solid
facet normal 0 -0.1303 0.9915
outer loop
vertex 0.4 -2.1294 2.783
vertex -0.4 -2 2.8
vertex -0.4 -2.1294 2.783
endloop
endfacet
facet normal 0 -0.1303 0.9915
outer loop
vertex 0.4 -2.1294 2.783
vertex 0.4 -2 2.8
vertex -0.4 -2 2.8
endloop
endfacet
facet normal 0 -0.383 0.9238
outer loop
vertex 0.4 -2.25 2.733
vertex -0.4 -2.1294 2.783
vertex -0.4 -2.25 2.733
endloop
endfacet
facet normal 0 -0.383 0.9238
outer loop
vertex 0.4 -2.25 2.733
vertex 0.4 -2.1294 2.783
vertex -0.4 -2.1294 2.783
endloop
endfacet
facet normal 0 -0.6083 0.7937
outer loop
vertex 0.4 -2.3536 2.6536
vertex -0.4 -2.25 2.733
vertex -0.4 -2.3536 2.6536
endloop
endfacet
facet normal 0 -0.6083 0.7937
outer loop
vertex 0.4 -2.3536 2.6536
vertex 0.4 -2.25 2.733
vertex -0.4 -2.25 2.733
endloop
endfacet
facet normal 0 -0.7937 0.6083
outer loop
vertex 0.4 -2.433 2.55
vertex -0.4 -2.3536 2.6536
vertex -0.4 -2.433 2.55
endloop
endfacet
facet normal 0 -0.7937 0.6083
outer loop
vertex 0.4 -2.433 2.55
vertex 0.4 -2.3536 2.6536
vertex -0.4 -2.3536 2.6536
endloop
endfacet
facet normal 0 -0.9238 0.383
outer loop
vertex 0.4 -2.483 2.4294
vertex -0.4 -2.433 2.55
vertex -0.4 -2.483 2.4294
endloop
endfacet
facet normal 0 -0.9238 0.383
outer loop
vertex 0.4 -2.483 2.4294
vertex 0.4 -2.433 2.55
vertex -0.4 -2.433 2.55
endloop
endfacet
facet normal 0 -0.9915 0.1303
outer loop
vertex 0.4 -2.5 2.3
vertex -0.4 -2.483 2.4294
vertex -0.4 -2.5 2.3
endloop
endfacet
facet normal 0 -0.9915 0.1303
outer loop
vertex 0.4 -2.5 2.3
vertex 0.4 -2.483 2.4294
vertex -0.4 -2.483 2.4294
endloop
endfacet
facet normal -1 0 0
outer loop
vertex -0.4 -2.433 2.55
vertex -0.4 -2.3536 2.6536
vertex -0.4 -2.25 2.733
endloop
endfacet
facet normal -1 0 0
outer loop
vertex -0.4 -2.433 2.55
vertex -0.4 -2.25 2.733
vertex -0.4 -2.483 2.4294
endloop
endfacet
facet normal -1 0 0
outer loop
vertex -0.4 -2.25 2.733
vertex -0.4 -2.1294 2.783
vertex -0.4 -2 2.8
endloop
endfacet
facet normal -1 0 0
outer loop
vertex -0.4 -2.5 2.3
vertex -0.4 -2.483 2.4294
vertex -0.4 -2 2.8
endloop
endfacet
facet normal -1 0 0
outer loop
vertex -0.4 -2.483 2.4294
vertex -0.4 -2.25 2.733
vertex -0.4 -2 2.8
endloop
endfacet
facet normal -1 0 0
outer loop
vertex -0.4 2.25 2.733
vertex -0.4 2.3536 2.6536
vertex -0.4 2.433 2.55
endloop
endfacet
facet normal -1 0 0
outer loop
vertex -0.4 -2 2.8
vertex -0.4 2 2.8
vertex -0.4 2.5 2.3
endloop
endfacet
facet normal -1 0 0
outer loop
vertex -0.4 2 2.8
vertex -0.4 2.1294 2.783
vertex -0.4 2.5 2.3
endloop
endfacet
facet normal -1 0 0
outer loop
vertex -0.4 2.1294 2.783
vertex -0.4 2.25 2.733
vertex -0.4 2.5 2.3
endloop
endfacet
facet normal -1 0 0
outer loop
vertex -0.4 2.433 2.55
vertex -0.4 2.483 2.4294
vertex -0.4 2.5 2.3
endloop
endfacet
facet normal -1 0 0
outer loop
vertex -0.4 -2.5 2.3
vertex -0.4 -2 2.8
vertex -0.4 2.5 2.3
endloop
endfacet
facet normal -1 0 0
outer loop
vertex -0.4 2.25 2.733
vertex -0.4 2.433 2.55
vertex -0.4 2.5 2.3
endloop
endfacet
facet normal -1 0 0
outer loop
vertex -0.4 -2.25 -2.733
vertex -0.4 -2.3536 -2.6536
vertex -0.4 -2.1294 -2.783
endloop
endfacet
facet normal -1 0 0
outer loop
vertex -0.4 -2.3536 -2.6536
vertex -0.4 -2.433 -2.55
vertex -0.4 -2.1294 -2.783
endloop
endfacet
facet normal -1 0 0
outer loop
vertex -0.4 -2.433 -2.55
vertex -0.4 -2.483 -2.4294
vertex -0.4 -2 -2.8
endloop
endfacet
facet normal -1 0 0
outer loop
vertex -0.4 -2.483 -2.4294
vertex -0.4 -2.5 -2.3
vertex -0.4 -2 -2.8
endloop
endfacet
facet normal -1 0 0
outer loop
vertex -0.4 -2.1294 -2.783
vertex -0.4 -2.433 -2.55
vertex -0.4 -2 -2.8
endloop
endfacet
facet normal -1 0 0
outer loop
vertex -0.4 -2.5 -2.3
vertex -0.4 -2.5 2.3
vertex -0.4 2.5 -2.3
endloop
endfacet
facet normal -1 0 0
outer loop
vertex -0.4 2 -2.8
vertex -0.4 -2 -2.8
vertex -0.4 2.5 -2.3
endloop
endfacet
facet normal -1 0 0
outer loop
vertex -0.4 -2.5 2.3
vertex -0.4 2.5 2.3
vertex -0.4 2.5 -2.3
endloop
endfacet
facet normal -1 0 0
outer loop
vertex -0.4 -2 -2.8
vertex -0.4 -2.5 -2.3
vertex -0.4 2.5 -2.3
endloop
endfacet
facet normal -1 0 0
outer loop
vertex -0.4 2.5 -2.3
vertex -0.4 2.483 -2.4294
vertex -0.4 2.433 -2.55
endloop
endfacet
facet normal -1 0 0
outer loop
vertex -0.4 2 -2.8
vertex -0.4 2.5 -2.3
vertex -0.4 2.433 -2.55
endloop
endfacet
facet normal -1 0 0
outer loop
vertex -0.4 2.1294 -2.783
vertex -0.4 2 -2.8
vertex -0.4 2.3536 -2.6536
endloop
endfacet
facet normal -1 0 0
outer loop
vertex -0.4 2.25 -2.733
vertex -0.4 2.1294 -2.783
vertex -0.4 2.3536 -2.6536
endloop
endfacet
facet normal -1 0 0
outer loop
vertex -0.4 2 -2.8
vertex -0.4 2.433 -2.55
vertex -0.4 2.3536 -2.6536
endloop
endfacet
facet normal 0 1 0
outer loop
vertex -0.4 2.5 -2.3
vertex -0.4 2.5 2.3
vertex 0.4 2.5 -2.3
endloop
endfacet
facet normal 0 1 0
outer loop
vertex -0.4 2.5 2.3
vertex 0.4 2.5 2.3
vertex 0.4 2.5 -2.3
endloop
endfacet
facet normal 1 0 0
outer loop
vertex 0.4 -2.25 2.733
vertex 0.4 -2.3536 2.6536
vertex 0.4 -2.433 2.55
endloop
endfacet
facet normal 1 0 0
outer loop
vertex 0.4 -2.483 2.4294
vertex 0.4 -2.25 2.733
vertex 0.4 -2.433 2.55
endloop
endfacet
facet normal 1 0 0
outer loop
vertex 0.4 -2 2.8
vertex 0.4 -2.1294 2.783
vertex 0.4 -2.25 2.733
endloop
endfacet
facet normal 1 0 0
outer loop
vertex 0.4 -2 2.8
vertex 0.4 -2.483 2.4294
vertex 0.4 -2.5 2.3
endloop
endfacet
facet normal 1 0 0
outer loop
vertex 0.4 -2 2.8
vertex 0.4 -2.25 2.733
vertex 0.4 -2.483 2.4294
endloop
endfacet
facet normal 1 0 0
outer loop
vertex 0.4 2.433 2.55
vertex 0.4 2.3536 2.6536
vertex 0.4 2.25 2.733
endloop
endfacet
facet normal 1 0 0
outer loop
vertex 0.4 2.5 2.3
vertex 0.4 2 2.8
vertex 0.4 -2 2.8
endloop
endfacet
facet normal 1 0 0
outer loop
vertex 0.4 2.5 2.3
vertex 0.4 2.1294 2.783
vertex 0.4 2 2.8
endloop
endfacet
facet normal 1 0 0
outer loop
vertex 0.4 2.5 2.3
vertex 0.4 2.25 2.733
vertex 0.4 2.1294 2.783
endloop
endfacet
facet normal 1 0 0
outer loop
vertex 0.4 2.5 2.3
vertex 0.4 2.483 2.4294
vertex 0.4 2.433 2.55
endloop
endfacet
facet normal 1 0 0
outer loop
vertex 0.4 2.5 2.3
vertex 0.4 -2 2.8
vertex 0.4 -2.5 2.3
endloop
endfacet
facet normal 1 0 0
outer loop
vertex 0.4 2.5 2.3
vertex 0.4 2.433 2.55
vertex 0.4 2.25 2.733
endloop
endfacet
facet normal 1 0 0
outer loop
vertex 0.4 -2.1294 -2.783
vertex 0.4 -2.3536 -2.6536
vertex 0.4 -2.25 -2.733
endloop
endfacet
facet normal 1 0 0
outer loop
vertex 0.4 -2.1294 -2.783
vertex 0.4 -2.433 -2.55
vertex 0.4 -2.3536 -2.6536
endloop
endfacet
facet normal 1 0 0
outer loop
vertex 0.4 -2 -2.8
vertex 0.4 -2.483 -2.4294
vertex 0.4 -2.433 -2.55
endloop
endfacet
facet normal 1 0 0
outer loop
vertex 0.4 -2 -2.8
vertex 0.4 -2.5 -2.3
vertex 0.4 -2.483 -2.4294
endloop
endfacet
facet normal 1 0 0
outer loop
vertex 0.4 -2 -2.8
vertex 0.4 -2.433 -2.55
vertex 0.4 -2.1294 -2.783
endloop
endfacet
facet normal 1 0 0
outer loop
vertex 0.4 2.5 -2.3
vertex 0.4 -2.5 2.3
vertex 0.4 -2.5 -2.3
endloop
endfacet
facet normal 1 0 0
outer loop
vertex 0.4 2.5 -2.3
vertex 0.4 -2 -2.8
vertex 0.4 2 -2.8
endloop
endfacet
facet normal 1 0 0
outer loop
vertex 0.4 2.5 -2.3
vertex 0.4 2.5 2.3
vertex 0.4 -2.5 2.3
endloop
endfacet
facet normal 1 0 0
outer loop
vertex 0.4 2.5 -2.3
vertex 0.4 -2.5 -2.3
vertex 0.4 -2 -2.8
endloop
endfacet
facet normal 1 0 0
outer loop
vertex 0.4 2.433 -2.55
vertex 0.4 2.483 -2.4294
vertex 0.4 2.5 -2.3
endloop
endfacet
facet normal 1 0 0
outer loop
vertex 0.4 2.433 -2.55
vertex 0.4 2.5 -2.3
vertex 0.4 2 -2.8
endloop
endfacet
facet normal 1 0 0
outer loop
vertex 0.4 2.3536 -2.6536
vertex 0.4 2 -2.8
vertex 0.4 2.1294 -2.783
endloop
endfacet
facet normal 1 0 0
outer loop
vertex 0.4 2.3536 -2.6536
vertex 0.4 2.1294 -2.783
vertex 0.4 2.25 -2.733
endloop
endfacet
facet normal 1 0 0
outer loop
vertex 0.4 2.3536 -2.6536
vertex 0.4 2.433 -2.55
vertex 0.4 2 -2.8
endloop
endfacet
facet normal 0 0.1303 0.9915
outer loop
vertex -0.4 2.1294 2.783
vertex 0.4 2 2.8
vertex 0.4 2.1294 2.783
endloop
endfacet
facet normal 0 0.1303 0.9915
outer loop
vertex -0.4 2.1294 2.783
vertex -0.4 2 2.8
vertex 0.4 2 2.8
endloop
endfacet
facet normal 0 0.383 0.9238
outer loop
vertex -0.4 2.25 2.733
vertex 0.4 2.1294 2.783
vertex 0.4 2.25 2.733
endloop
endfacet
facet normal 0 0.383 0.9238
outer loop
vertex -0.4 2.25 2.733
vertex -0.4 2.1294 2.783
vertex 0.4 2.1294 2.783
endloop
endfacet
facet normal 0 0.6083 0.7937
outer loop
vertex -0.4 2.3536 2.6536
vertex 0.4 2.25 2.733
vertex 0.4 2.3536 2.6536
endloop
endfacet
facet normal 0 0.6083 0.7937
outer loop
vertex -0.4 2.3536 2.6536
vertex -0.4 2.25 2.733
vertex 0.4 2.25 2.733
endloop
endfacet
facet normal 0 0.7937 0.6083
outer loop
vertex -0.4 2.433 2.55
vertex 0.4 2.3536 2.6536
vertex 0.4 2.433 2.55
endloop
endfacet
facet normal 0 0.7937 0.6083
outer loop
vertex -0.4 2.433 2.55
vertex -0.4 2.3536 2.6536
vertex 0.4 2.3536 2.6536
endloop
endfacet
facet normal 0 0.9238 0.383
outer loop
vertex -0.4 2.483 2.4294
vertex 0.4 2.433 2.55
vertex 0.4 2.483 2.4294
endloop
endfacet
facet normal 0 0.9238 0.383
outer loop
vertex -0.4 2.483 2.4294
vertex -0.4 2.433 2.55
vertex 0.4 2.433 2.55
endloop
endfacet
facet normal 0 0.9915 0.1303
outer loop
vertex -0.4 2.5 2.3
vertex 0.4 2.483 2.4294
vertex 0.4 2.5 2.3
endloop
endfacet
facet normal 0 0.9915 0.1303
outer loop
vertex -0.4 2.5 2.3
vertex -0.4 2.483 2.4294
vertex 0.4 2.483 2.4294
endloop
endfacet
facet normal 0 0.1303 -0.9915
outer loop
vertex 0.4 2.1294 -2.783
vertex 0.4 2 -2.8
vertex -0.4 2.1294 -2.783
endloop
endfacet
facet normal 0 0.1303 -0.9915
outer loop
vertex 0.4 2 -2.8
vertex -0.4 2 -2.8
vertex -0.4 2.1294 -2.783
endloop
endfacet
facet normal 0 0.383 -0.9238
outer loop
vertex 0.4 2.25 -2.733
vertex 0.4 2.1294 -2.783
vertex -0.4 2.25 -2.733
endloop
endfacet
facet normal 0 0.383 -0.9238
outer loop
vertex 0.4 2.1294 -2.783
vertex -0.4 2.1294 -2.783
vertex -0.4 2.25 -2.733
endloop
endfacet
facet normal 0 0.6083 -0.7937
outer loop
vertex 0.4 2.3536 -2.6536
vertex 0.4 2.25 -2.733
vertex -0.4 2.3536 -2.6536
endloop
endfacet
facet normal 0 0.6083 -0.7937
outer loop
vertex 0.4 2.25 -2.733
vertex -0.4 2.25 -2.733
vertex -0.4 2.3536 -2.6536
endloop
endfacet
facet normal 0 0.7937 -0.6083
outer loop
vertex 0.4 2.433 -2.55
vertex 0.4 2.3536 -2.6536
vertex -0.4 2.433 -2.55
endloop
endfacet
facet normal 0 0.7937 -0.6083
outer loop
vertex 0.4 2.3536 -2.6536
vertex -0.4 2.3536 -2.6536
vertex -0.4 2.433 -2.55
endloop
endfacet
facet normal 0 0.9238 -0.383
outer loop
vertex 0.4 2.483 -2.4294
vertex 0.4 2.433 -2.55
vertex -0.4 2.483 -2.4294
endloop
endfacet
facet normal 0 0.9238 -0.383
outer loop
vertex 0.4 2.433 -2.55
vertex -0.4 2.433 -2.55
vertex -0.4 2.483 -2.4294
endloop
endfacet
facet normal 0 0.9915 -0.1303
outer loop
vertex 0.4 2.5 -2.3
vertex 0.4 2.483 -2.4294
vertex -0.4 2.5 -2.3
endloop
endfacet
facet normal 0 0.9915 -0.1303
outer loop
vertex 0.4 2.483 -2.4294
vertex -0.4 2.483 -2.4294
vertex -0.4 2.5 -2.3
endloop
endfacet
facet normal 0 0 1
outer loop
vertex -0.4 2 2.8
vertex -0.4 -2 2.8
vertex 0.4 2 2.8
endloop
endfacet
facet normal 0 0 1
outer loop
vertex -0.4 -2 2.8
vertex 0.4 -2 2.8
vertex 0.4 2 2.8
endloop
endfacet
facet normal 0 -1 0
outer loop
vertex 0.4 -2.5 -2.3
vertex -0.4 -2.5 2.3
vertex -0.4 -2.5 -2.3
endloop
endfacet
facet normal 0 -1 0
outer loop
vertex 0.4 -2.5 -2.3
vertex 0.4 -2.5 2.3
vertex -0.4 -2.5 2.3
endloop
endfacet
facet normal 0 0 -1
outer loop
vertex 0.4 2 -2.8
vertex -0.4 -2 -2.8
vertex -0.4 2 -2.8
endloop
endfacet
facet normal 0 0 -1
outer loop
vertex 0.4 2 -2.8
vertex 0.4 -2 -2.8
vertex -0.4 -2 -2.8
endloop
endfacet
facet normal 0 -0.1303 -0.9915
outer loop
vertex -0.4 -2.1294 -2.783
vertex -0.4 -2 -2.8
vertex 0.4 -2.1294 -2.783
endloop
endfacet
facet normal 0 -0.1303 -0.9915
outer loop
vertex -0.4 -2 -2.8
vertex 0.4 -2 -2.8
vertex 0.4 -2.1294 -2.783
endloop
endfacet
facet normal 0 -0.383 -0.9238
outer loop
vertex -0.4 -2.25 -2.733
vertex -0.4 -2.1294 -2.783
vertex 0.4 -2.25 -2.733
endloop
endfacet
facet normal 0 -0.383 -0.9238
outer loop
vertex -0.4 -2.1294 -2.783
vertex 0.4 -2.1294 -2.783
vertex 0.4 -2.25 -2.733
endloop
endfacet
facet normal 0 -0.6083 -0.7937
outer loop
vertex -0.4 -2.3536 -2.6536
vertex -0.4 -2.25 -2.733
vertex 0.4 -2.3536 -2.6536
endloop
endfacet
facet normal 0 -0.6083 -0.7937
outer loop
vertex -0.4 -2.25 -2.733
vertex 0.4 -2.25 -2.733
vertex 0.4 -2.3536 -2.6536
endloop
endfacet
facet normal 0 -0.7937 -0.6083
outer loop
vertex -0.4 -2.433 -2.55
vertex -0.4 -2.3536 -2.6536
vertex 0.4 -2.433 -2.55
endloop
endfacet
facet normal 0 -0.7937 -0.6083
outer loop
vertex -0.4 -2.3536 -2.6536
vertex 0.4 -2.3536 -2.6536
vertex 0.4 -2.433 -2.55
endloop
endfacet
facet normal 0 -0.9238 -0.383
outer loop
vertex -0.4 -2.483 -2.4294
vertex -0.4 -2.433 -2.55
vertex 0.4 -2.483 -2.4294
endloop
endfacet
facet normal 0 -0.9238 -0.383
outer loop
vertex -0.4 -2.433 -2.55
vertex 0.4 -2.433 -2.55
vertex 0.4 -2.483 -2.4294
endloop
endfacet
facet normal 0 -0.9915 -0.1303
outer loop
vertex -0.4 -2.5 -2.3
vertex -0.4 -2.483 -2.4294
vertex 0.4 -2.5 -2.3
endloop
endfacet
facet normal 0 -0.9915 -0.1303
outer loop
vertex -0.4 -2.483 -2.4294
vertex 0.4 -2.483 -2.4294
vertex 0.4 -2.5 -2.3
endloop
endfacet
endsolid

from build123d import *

# Parameters (mm, degrees)
BASES_W    = 5.6
BASES_H    = 5
BASE_DEPTH = 0.4
BASEF_R    = 0.5


with BuildPart() as part:
    # BaseS → Base (new, symmetric)
    with BuildSketch(Plane(origin=(0, 0, 0), x_dir=(0, 0, -1), z_dir=(1, 0, 0))):
        Rectangle(BASES_W, BASES_H)
    extrude(amount=BASE_DEPTH, both=True)

    # BaseF
    basef_edges = [part.edges().sort_by_distance(p)[0] for p in [
        (0, -2.5, -2.8),
        (0, -2.5, 2.8),
        (0, 2.5, 2.8),
        (0, 2.5, -2.8),
    ]]
    fillet(basef_edges, radius=BASEF_R)


solid = part.part
